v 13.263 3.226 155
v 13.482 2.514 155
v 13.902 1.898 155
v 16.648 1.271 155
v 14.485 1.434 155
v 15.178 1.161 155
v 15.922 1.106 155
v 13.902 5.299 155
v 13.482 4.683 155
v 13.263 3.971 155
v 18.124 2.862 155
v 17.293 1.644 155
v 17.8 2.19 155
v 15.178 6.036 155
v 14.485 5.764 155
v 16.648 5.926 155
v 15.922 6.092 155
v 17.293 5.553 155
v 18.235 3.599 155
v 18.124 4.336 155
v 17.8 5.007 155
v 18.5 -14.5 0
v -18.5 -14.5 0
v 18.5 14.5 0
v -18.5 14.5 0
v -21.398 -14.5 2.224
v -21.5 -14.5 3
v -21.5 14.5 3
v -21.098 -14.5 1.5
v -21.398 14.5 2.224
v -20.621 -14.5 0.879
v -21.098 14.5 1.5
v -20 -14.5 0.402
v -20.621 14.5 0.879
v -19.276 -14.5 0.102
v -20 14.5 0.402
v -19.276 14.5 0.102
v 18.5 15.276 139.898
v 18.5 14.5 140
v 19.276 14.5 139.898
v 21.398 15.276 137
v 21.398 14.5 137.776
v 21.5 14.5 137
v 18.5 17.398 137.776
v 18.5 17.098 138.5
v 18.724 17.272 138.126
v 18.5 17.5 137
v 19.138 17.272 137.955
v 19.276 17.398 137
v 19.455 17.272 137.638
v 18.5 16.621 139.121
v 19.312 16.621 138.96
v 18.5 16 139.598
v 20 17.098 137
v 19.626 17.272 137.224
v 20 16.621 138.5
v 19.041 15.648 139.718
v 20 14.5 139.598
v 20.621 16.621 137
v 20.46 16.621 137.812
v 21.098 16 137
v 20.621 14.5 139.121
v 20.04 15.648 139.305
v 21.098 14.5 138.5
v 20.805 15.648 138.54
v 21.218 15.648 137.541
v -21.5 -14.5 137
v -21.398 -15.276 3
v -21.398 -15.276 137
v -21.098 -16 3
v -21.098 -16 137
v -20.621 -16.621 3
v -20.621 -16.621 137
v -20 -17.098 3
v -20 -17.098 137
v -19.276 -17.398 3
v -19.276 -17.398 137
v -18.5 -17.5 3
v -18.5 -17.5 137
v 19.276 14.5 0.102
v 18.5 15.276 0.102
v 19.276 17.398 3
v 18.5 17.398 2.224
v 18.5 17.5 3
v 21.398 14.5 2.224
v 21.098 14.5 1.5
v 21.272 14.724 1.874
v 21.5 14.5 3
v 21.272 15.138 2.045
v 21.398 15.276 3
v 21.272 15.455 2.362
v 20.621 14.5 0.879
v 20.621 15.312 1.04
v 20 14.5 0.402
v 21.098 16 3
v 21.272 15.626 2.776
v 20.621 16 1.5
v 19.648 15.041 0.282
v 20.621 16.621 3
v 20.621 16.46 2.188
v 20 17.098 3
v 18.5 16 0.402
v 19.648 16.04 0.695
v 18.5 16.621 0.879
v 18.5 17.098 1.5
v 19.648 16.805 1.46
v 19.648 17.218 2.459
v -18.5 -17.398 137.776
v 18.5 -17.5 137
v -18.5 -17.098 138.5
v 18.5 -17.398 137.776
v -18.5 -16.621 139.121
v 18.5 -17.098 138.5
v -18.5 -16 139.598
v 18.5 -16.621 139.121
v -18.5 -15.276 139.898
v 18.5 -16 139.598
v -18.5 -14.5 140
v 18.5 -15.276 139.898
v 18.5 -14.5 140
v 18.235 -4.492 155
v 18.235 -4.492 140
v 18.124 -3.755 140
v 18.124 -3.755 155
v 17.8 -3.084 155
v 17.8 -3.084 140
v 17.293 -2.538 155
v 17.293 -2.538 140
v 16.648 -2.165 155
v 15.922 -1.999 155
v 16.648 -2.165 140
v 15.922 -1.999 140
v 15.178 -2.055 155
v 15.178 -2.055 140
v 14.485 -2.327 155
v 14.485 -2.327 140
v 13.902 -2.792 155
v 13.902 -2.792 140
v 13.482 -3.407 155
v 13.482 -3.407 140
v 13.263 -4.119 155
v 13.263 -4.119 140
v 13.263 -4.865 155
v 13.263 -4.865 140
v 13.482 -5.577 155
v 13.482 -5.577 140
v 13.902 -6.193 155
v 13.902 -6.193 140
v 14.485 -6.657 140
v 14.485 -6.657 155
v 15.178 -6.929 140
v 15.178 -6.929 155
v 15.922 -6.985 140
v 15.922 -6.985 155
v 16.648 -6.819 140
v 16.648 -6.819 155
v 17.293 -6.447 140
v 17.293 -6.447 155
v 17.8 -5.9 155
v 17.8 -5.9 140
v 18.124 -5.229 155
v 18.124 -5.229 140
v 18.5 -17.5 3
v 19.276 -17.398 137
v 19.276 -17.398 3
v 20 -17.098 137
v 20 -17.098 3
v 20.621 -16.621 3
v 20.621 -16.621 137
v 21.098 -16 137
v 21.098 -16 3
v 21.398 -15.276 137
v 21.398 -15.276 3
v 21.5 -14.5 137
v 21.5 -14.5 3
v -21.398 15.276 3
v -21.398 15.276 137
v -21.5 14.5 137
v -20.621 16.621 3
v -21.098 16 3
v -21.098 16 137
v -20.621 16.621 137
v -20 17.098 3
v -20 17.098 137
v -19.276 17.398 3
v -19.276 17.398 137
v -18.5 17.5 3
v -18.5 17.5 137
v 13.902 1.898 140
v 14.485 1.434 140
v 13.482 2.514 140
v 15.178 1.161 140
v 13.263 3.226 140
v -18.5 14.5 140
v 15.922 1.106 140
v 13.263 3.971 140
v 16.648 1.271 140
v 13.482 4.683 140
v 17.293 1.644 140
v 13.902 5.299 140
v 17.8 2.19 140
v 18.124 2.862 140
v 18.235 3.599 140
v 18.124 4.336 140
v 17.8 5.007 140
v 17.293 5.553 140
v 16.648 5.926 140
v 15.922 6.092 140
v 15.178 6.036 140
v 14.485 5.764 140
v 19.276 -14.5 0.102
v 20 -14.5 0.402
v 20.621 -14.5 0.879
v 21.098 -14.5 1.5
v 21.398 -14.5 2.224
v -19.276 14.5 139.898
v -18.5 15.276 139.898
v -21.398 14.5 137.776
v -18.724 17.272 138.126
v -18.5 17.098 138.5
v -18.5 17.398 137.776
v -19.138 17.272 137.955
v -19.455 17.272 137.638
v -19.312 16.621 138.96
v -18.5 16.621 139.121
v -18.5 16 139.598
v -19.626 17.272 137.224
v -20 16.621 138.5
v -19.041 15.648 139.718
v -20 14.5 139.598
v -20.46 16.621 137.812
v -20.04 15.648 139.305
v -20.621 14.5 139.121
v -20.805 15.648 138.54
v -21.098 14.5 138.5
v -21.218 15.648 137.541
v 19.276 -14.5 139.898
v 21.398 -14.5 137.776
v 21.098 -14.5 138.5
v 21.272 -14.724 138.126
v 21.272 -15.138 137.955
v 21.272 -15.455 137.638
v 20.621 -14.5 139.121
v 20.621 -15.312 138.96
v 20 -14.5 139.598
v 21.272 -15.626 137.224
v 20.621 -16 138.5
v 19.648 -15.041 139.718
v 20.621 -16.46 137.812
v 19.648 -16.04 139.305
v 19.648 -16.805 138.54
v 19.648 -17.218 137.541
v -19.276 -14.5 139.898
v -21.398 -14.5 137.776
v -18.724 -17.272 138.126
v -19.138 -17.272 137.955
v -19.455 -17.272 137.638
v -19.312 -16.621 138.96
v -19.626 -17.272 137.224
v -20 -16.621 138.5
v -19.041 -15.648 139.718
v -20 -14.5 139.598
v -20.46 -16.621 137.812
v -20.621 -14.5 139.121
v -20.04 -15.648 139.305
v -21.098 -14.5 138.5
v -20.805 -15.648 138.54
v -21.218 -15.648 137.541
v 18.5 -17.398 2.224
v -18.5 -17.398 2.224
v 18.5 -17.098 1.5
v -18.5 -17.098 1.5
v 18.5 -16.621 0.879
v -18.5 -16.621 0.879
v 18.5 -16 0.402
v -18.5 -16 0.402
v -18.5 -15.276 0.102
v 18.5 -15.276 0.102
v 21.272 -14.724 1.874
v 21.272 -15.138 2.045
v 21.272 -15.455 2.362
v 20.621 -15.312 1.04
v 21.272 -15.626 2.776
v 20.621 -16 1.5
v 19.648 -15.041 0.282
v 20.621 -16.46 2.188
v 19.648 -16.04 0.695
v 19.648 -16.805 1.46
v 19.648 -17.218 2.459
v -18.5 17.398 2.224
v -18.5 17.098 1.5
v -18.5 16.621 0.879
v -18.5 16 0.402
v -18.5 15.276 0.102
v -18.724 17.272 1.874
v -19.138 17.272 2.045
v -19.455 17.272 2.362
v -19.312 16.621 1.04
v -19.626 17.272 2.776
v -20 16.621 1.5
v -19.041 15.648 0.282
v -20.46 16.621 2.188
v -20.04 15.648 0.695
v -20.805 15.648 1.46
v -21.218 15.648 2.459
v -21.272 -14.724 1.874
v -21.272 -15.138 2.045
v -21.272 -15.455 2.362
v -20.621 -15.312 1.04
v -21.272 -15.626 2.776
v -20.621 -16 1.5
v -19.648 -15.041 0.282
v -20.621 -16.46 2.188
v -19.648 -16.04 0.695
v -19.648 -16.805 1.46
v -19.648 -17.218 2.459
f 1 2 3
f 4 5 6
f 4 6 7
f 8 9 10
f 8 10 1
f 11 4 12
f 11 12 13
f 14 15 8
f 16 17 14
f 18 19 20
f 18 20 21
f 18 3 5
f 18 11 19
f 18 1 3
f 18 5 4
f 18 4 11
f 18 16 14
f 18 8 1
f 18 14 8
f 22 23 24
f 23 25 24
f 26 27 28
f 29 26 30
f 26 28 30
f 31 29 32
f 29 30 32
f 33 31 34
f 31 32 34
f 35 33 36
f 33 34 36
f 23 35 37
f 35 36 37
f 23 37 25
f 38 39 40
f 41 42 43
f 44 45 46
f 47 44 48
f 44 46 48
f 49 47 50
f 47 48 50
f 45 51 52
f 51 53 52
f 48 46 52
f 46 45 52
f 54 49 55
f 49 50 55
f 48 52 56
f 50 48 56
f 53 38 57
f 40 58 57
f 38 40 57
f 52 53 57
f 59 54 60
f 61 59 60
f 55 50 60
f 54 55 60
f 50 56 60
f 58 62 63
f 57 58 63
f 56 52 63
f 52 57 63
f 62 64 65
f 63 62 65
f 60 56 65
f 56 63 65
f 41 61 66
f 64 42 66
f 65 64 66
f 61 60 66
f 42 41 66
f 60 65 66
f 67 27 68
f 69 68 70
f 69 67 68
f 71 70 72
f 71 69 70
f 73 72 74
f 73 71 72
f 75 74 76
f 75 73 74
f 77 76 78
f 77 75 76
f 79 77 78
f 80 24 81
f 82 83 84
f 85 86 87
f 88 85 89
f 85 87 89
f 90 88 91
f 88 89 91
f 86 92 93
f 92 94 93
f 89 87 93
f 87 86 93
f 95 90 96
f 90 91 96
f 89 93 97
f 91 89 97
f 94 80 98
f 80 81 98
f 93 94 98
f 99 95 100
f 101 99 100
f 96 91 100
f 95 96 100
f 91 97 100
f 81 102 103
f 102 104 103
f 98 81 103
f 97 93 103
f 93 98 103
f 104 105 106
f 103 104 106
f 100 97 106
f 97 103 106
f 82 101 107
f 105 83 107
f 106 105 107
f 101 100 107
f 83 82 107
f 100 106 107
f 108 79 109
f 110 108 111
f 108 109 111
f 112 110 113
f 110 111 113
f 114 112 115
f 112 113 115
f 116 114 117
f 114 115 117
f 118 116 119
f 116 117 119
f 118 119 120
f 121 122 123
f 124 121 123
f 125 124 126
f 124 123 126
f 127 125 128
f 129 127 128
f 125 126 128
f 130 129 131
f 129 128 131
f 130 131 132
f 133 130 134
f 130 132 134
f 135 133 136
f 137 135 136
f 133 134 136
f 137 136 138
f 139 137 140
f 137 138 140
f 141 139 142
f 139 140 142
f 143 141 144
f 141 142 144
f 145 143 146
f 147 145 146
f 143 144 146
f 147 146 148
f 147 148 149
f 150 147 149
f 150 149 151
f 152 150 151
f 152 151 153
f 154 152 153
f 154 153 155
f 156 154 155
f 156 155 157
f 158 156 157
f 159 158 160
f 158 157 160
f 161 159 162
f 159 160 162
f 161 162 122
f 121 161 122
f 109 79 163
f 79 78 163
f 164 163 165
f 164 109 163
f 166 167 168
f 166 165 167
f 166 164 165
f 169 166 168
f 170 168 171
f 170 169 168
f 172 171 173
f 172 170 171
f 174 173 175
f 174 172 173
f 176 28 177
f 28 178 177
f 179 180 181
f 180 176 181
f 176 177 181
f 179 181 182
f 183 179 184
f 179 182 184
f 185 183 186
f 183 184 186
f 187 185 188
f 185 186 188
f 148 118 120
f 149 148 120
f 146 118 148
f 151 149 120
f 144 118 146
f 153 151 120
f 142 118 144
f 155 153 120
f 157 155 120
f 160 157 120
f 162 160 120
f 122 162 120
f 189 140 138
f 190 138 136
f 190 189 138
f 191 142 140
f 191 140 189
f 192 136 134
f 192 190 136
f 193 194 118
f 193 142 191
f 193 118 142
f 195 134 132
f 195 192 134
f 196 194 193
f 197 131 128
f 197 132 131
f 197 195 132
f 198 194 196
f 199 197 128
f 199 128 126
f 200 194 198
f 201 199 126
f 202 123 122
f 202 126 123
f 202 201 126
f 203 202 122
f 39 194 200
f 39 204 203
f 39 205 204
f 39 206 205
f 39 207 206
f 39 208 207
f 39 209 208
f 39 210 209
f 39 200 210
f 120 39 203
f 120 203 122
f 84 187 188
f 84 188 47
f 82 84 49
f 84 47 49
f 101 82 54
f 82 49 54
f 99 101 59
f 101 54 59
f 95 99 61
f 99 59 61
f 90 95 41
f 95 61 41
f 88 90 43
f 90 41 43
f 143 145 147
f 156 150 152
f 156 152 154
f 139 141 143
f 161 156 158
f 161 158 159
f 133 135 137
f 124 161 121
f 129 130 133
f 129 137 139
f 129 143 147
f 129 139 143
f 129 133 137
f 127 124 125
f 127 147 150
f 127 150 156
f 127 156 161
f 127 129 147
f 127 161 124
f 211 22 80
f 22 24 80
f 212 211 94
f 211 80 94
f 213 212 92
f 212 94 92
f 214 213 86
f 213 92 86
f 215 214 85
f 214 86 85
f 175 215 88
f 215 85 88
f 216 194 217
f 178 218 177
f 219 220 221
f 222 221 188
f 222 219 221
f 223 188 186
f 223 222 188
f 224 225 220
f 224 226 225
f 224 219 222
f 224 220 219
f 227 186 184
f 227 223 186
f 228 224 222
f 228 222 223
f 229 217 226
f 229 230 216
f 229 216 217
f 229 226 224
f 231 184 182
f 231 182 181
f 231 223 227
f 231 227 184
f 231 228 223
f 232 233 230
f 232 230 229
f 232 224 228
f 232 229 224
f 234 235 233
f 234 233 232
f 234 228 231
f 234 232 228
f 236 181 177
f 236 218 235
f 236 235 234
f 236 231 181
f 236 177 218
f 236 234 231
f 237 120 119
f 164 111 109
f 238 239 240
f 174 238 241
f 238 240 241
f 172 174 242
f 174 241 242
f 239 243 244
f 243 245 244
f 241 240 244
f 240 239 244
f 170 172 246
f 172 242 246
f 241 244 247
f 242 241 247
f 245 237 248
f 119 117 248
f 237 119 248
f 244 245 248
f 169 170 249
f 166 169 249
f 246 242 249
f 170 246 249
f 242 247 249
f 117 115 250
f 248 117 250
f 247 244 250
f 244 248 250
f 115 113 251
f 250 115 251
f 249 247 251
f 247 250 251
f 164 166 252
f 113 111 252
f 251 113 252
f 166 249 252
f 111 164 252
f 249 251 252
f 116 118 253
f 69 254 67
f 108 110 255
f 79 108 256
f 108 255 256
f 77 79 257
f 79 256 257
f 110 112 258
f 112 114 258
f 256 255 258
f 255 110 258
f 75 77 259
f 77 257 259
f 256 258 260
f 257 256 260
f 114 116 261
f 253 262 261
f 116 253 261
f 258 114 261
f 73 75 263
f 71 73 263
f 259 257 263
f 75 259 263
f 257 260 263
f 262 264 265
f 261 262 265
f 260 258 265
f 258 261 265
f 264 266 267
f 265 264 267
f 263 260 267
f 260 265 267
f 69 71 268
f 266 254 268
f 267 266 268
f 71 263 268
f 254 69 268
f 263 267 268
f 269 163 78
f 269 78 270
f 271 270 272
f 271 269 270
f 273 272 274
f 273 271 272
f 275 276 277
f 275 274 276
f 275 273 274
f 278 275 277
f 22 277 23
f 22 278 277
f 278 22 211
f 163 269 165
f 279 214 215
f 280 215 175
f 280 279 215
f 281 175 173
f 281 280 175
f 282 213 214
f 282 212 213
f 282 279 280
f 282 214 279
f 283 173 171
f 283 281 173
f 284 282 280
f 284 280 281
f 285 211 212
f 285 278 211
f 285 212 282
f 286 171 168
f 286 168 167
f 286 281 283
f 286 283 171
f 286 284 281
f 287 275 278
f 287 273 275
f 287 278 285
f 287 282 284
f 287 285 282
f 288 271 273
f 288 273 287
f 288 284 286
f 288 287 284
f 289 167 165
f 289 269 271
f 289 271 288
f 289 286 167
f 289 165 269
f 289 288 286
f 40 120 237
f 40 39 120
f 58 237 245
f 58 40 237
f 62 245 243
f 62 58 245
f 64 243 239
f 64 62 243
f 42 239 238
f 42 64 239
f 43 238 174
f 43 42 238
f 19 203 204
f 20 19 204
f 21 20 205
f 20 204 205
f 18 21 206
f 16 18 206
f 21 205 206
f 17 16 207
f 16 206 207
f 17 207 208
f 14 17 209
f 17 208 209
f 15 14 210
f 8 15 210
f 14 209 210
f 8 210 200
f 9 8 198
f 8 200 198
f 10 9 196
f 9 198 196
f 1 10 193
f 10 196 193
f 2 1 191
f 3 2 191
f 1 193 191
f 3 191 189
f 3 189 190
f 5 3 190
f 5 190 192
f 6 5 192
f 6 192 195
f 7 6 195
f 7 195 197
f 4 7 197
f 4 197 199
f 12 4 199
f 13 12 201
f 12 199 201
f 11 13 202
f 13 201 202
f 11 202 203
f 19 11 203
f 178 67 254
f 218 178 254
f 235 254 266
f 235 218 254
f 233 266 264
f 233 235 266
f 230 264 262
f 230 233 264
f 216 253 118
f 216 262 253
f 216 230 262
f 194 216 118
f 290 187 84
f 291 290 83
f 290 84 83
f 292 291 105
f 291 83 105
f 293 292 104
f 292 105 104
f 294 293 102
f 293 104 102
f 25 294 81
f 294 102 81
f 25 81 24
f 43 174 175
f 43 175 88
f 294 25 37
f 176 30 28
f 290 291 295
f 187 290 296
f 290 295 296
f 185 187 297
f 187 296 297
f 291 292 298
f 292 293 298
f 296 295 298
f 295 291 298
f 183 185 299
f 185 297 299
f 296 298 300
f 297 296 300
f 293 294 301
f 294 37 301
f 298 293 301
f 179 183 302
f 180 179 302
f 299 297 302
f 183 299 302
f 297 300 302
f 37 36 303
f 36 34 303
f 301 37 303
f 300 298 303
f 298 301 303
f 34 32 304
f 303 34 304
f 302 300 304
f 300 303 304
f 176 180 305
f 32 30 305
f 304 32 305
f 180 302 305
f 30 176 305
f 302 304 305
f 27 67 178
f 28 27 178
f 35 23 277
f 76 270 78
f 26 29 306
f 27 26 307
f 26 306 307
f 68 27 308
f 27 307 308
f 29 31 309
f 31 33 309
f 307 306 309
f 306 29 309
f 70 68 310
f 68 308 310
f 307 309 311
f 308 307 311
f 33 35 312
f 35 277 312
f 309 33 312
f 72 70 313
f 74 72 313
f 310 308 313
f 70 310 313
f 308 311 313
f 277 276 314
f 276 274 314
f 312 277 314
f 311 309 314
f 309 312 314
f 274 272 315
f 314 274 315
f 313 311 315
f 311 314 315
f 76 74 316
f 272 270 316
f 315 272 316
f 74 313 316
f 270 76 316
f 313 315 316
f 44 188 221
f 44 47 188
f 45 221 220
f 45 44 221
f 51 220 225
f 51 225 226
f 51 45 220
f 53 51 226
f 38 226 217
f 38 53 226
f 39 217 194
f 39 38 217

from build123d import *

# Parameters (mm, degrees)
SKETCH_1_W      = 43
SKETCH_1_H      = 35
EXTRUDE_1_DEPTH = 140
SKETCH_2_R      = 2.5
EXTRUDE_2_DEPTH = 15
FILLET_1_R      = 3


with BuildPart() as part:
    # Эскиз1 → Бобышка-Вытянуть1 (new body)
    with BuildSketch(Plane.XY):
        Rectangle(SKETCH_1_W, SKETCH_1_H)
    extrude(amount=EXTRUDE_1_DEPTH)

    # Эскиз2 → Бобышка-Вытянуть2 (add)
    with BuildSketch(Plane.XY.offset(140)):
        with Locations((15.734743007, 3.598639962)):
            Circle(SKETCH_2_R)
        with Locations((15.734743007, -4.492095401)):
            Circle(SKETCH_2_R)
    extrude(amount=EXTRUDE_2_DEPTH)

    # Скругление1
    fillet_1_edges = [part.edges().sort_by_distance(p)[0] for p in [
        (-21.5, 0, 140),
        (0, -17.5, 140),
        (21.5, 0, 140),
        (0, -17.5, 0),
        (-21.5, 0, 0),
        (0, 17.5, 0),
        (21.5, 0, 0),
        (0, 17.5, 140),
        (21.5, -17.5, 70),
        (-21.5, -17.5, 70),
        (-21.5, 17.5, 70),
        (21.5, 17.5, 70),
    ]]
    fillet(fillet_1_edges, radius=FILLET_1_R)


solid = part.part
